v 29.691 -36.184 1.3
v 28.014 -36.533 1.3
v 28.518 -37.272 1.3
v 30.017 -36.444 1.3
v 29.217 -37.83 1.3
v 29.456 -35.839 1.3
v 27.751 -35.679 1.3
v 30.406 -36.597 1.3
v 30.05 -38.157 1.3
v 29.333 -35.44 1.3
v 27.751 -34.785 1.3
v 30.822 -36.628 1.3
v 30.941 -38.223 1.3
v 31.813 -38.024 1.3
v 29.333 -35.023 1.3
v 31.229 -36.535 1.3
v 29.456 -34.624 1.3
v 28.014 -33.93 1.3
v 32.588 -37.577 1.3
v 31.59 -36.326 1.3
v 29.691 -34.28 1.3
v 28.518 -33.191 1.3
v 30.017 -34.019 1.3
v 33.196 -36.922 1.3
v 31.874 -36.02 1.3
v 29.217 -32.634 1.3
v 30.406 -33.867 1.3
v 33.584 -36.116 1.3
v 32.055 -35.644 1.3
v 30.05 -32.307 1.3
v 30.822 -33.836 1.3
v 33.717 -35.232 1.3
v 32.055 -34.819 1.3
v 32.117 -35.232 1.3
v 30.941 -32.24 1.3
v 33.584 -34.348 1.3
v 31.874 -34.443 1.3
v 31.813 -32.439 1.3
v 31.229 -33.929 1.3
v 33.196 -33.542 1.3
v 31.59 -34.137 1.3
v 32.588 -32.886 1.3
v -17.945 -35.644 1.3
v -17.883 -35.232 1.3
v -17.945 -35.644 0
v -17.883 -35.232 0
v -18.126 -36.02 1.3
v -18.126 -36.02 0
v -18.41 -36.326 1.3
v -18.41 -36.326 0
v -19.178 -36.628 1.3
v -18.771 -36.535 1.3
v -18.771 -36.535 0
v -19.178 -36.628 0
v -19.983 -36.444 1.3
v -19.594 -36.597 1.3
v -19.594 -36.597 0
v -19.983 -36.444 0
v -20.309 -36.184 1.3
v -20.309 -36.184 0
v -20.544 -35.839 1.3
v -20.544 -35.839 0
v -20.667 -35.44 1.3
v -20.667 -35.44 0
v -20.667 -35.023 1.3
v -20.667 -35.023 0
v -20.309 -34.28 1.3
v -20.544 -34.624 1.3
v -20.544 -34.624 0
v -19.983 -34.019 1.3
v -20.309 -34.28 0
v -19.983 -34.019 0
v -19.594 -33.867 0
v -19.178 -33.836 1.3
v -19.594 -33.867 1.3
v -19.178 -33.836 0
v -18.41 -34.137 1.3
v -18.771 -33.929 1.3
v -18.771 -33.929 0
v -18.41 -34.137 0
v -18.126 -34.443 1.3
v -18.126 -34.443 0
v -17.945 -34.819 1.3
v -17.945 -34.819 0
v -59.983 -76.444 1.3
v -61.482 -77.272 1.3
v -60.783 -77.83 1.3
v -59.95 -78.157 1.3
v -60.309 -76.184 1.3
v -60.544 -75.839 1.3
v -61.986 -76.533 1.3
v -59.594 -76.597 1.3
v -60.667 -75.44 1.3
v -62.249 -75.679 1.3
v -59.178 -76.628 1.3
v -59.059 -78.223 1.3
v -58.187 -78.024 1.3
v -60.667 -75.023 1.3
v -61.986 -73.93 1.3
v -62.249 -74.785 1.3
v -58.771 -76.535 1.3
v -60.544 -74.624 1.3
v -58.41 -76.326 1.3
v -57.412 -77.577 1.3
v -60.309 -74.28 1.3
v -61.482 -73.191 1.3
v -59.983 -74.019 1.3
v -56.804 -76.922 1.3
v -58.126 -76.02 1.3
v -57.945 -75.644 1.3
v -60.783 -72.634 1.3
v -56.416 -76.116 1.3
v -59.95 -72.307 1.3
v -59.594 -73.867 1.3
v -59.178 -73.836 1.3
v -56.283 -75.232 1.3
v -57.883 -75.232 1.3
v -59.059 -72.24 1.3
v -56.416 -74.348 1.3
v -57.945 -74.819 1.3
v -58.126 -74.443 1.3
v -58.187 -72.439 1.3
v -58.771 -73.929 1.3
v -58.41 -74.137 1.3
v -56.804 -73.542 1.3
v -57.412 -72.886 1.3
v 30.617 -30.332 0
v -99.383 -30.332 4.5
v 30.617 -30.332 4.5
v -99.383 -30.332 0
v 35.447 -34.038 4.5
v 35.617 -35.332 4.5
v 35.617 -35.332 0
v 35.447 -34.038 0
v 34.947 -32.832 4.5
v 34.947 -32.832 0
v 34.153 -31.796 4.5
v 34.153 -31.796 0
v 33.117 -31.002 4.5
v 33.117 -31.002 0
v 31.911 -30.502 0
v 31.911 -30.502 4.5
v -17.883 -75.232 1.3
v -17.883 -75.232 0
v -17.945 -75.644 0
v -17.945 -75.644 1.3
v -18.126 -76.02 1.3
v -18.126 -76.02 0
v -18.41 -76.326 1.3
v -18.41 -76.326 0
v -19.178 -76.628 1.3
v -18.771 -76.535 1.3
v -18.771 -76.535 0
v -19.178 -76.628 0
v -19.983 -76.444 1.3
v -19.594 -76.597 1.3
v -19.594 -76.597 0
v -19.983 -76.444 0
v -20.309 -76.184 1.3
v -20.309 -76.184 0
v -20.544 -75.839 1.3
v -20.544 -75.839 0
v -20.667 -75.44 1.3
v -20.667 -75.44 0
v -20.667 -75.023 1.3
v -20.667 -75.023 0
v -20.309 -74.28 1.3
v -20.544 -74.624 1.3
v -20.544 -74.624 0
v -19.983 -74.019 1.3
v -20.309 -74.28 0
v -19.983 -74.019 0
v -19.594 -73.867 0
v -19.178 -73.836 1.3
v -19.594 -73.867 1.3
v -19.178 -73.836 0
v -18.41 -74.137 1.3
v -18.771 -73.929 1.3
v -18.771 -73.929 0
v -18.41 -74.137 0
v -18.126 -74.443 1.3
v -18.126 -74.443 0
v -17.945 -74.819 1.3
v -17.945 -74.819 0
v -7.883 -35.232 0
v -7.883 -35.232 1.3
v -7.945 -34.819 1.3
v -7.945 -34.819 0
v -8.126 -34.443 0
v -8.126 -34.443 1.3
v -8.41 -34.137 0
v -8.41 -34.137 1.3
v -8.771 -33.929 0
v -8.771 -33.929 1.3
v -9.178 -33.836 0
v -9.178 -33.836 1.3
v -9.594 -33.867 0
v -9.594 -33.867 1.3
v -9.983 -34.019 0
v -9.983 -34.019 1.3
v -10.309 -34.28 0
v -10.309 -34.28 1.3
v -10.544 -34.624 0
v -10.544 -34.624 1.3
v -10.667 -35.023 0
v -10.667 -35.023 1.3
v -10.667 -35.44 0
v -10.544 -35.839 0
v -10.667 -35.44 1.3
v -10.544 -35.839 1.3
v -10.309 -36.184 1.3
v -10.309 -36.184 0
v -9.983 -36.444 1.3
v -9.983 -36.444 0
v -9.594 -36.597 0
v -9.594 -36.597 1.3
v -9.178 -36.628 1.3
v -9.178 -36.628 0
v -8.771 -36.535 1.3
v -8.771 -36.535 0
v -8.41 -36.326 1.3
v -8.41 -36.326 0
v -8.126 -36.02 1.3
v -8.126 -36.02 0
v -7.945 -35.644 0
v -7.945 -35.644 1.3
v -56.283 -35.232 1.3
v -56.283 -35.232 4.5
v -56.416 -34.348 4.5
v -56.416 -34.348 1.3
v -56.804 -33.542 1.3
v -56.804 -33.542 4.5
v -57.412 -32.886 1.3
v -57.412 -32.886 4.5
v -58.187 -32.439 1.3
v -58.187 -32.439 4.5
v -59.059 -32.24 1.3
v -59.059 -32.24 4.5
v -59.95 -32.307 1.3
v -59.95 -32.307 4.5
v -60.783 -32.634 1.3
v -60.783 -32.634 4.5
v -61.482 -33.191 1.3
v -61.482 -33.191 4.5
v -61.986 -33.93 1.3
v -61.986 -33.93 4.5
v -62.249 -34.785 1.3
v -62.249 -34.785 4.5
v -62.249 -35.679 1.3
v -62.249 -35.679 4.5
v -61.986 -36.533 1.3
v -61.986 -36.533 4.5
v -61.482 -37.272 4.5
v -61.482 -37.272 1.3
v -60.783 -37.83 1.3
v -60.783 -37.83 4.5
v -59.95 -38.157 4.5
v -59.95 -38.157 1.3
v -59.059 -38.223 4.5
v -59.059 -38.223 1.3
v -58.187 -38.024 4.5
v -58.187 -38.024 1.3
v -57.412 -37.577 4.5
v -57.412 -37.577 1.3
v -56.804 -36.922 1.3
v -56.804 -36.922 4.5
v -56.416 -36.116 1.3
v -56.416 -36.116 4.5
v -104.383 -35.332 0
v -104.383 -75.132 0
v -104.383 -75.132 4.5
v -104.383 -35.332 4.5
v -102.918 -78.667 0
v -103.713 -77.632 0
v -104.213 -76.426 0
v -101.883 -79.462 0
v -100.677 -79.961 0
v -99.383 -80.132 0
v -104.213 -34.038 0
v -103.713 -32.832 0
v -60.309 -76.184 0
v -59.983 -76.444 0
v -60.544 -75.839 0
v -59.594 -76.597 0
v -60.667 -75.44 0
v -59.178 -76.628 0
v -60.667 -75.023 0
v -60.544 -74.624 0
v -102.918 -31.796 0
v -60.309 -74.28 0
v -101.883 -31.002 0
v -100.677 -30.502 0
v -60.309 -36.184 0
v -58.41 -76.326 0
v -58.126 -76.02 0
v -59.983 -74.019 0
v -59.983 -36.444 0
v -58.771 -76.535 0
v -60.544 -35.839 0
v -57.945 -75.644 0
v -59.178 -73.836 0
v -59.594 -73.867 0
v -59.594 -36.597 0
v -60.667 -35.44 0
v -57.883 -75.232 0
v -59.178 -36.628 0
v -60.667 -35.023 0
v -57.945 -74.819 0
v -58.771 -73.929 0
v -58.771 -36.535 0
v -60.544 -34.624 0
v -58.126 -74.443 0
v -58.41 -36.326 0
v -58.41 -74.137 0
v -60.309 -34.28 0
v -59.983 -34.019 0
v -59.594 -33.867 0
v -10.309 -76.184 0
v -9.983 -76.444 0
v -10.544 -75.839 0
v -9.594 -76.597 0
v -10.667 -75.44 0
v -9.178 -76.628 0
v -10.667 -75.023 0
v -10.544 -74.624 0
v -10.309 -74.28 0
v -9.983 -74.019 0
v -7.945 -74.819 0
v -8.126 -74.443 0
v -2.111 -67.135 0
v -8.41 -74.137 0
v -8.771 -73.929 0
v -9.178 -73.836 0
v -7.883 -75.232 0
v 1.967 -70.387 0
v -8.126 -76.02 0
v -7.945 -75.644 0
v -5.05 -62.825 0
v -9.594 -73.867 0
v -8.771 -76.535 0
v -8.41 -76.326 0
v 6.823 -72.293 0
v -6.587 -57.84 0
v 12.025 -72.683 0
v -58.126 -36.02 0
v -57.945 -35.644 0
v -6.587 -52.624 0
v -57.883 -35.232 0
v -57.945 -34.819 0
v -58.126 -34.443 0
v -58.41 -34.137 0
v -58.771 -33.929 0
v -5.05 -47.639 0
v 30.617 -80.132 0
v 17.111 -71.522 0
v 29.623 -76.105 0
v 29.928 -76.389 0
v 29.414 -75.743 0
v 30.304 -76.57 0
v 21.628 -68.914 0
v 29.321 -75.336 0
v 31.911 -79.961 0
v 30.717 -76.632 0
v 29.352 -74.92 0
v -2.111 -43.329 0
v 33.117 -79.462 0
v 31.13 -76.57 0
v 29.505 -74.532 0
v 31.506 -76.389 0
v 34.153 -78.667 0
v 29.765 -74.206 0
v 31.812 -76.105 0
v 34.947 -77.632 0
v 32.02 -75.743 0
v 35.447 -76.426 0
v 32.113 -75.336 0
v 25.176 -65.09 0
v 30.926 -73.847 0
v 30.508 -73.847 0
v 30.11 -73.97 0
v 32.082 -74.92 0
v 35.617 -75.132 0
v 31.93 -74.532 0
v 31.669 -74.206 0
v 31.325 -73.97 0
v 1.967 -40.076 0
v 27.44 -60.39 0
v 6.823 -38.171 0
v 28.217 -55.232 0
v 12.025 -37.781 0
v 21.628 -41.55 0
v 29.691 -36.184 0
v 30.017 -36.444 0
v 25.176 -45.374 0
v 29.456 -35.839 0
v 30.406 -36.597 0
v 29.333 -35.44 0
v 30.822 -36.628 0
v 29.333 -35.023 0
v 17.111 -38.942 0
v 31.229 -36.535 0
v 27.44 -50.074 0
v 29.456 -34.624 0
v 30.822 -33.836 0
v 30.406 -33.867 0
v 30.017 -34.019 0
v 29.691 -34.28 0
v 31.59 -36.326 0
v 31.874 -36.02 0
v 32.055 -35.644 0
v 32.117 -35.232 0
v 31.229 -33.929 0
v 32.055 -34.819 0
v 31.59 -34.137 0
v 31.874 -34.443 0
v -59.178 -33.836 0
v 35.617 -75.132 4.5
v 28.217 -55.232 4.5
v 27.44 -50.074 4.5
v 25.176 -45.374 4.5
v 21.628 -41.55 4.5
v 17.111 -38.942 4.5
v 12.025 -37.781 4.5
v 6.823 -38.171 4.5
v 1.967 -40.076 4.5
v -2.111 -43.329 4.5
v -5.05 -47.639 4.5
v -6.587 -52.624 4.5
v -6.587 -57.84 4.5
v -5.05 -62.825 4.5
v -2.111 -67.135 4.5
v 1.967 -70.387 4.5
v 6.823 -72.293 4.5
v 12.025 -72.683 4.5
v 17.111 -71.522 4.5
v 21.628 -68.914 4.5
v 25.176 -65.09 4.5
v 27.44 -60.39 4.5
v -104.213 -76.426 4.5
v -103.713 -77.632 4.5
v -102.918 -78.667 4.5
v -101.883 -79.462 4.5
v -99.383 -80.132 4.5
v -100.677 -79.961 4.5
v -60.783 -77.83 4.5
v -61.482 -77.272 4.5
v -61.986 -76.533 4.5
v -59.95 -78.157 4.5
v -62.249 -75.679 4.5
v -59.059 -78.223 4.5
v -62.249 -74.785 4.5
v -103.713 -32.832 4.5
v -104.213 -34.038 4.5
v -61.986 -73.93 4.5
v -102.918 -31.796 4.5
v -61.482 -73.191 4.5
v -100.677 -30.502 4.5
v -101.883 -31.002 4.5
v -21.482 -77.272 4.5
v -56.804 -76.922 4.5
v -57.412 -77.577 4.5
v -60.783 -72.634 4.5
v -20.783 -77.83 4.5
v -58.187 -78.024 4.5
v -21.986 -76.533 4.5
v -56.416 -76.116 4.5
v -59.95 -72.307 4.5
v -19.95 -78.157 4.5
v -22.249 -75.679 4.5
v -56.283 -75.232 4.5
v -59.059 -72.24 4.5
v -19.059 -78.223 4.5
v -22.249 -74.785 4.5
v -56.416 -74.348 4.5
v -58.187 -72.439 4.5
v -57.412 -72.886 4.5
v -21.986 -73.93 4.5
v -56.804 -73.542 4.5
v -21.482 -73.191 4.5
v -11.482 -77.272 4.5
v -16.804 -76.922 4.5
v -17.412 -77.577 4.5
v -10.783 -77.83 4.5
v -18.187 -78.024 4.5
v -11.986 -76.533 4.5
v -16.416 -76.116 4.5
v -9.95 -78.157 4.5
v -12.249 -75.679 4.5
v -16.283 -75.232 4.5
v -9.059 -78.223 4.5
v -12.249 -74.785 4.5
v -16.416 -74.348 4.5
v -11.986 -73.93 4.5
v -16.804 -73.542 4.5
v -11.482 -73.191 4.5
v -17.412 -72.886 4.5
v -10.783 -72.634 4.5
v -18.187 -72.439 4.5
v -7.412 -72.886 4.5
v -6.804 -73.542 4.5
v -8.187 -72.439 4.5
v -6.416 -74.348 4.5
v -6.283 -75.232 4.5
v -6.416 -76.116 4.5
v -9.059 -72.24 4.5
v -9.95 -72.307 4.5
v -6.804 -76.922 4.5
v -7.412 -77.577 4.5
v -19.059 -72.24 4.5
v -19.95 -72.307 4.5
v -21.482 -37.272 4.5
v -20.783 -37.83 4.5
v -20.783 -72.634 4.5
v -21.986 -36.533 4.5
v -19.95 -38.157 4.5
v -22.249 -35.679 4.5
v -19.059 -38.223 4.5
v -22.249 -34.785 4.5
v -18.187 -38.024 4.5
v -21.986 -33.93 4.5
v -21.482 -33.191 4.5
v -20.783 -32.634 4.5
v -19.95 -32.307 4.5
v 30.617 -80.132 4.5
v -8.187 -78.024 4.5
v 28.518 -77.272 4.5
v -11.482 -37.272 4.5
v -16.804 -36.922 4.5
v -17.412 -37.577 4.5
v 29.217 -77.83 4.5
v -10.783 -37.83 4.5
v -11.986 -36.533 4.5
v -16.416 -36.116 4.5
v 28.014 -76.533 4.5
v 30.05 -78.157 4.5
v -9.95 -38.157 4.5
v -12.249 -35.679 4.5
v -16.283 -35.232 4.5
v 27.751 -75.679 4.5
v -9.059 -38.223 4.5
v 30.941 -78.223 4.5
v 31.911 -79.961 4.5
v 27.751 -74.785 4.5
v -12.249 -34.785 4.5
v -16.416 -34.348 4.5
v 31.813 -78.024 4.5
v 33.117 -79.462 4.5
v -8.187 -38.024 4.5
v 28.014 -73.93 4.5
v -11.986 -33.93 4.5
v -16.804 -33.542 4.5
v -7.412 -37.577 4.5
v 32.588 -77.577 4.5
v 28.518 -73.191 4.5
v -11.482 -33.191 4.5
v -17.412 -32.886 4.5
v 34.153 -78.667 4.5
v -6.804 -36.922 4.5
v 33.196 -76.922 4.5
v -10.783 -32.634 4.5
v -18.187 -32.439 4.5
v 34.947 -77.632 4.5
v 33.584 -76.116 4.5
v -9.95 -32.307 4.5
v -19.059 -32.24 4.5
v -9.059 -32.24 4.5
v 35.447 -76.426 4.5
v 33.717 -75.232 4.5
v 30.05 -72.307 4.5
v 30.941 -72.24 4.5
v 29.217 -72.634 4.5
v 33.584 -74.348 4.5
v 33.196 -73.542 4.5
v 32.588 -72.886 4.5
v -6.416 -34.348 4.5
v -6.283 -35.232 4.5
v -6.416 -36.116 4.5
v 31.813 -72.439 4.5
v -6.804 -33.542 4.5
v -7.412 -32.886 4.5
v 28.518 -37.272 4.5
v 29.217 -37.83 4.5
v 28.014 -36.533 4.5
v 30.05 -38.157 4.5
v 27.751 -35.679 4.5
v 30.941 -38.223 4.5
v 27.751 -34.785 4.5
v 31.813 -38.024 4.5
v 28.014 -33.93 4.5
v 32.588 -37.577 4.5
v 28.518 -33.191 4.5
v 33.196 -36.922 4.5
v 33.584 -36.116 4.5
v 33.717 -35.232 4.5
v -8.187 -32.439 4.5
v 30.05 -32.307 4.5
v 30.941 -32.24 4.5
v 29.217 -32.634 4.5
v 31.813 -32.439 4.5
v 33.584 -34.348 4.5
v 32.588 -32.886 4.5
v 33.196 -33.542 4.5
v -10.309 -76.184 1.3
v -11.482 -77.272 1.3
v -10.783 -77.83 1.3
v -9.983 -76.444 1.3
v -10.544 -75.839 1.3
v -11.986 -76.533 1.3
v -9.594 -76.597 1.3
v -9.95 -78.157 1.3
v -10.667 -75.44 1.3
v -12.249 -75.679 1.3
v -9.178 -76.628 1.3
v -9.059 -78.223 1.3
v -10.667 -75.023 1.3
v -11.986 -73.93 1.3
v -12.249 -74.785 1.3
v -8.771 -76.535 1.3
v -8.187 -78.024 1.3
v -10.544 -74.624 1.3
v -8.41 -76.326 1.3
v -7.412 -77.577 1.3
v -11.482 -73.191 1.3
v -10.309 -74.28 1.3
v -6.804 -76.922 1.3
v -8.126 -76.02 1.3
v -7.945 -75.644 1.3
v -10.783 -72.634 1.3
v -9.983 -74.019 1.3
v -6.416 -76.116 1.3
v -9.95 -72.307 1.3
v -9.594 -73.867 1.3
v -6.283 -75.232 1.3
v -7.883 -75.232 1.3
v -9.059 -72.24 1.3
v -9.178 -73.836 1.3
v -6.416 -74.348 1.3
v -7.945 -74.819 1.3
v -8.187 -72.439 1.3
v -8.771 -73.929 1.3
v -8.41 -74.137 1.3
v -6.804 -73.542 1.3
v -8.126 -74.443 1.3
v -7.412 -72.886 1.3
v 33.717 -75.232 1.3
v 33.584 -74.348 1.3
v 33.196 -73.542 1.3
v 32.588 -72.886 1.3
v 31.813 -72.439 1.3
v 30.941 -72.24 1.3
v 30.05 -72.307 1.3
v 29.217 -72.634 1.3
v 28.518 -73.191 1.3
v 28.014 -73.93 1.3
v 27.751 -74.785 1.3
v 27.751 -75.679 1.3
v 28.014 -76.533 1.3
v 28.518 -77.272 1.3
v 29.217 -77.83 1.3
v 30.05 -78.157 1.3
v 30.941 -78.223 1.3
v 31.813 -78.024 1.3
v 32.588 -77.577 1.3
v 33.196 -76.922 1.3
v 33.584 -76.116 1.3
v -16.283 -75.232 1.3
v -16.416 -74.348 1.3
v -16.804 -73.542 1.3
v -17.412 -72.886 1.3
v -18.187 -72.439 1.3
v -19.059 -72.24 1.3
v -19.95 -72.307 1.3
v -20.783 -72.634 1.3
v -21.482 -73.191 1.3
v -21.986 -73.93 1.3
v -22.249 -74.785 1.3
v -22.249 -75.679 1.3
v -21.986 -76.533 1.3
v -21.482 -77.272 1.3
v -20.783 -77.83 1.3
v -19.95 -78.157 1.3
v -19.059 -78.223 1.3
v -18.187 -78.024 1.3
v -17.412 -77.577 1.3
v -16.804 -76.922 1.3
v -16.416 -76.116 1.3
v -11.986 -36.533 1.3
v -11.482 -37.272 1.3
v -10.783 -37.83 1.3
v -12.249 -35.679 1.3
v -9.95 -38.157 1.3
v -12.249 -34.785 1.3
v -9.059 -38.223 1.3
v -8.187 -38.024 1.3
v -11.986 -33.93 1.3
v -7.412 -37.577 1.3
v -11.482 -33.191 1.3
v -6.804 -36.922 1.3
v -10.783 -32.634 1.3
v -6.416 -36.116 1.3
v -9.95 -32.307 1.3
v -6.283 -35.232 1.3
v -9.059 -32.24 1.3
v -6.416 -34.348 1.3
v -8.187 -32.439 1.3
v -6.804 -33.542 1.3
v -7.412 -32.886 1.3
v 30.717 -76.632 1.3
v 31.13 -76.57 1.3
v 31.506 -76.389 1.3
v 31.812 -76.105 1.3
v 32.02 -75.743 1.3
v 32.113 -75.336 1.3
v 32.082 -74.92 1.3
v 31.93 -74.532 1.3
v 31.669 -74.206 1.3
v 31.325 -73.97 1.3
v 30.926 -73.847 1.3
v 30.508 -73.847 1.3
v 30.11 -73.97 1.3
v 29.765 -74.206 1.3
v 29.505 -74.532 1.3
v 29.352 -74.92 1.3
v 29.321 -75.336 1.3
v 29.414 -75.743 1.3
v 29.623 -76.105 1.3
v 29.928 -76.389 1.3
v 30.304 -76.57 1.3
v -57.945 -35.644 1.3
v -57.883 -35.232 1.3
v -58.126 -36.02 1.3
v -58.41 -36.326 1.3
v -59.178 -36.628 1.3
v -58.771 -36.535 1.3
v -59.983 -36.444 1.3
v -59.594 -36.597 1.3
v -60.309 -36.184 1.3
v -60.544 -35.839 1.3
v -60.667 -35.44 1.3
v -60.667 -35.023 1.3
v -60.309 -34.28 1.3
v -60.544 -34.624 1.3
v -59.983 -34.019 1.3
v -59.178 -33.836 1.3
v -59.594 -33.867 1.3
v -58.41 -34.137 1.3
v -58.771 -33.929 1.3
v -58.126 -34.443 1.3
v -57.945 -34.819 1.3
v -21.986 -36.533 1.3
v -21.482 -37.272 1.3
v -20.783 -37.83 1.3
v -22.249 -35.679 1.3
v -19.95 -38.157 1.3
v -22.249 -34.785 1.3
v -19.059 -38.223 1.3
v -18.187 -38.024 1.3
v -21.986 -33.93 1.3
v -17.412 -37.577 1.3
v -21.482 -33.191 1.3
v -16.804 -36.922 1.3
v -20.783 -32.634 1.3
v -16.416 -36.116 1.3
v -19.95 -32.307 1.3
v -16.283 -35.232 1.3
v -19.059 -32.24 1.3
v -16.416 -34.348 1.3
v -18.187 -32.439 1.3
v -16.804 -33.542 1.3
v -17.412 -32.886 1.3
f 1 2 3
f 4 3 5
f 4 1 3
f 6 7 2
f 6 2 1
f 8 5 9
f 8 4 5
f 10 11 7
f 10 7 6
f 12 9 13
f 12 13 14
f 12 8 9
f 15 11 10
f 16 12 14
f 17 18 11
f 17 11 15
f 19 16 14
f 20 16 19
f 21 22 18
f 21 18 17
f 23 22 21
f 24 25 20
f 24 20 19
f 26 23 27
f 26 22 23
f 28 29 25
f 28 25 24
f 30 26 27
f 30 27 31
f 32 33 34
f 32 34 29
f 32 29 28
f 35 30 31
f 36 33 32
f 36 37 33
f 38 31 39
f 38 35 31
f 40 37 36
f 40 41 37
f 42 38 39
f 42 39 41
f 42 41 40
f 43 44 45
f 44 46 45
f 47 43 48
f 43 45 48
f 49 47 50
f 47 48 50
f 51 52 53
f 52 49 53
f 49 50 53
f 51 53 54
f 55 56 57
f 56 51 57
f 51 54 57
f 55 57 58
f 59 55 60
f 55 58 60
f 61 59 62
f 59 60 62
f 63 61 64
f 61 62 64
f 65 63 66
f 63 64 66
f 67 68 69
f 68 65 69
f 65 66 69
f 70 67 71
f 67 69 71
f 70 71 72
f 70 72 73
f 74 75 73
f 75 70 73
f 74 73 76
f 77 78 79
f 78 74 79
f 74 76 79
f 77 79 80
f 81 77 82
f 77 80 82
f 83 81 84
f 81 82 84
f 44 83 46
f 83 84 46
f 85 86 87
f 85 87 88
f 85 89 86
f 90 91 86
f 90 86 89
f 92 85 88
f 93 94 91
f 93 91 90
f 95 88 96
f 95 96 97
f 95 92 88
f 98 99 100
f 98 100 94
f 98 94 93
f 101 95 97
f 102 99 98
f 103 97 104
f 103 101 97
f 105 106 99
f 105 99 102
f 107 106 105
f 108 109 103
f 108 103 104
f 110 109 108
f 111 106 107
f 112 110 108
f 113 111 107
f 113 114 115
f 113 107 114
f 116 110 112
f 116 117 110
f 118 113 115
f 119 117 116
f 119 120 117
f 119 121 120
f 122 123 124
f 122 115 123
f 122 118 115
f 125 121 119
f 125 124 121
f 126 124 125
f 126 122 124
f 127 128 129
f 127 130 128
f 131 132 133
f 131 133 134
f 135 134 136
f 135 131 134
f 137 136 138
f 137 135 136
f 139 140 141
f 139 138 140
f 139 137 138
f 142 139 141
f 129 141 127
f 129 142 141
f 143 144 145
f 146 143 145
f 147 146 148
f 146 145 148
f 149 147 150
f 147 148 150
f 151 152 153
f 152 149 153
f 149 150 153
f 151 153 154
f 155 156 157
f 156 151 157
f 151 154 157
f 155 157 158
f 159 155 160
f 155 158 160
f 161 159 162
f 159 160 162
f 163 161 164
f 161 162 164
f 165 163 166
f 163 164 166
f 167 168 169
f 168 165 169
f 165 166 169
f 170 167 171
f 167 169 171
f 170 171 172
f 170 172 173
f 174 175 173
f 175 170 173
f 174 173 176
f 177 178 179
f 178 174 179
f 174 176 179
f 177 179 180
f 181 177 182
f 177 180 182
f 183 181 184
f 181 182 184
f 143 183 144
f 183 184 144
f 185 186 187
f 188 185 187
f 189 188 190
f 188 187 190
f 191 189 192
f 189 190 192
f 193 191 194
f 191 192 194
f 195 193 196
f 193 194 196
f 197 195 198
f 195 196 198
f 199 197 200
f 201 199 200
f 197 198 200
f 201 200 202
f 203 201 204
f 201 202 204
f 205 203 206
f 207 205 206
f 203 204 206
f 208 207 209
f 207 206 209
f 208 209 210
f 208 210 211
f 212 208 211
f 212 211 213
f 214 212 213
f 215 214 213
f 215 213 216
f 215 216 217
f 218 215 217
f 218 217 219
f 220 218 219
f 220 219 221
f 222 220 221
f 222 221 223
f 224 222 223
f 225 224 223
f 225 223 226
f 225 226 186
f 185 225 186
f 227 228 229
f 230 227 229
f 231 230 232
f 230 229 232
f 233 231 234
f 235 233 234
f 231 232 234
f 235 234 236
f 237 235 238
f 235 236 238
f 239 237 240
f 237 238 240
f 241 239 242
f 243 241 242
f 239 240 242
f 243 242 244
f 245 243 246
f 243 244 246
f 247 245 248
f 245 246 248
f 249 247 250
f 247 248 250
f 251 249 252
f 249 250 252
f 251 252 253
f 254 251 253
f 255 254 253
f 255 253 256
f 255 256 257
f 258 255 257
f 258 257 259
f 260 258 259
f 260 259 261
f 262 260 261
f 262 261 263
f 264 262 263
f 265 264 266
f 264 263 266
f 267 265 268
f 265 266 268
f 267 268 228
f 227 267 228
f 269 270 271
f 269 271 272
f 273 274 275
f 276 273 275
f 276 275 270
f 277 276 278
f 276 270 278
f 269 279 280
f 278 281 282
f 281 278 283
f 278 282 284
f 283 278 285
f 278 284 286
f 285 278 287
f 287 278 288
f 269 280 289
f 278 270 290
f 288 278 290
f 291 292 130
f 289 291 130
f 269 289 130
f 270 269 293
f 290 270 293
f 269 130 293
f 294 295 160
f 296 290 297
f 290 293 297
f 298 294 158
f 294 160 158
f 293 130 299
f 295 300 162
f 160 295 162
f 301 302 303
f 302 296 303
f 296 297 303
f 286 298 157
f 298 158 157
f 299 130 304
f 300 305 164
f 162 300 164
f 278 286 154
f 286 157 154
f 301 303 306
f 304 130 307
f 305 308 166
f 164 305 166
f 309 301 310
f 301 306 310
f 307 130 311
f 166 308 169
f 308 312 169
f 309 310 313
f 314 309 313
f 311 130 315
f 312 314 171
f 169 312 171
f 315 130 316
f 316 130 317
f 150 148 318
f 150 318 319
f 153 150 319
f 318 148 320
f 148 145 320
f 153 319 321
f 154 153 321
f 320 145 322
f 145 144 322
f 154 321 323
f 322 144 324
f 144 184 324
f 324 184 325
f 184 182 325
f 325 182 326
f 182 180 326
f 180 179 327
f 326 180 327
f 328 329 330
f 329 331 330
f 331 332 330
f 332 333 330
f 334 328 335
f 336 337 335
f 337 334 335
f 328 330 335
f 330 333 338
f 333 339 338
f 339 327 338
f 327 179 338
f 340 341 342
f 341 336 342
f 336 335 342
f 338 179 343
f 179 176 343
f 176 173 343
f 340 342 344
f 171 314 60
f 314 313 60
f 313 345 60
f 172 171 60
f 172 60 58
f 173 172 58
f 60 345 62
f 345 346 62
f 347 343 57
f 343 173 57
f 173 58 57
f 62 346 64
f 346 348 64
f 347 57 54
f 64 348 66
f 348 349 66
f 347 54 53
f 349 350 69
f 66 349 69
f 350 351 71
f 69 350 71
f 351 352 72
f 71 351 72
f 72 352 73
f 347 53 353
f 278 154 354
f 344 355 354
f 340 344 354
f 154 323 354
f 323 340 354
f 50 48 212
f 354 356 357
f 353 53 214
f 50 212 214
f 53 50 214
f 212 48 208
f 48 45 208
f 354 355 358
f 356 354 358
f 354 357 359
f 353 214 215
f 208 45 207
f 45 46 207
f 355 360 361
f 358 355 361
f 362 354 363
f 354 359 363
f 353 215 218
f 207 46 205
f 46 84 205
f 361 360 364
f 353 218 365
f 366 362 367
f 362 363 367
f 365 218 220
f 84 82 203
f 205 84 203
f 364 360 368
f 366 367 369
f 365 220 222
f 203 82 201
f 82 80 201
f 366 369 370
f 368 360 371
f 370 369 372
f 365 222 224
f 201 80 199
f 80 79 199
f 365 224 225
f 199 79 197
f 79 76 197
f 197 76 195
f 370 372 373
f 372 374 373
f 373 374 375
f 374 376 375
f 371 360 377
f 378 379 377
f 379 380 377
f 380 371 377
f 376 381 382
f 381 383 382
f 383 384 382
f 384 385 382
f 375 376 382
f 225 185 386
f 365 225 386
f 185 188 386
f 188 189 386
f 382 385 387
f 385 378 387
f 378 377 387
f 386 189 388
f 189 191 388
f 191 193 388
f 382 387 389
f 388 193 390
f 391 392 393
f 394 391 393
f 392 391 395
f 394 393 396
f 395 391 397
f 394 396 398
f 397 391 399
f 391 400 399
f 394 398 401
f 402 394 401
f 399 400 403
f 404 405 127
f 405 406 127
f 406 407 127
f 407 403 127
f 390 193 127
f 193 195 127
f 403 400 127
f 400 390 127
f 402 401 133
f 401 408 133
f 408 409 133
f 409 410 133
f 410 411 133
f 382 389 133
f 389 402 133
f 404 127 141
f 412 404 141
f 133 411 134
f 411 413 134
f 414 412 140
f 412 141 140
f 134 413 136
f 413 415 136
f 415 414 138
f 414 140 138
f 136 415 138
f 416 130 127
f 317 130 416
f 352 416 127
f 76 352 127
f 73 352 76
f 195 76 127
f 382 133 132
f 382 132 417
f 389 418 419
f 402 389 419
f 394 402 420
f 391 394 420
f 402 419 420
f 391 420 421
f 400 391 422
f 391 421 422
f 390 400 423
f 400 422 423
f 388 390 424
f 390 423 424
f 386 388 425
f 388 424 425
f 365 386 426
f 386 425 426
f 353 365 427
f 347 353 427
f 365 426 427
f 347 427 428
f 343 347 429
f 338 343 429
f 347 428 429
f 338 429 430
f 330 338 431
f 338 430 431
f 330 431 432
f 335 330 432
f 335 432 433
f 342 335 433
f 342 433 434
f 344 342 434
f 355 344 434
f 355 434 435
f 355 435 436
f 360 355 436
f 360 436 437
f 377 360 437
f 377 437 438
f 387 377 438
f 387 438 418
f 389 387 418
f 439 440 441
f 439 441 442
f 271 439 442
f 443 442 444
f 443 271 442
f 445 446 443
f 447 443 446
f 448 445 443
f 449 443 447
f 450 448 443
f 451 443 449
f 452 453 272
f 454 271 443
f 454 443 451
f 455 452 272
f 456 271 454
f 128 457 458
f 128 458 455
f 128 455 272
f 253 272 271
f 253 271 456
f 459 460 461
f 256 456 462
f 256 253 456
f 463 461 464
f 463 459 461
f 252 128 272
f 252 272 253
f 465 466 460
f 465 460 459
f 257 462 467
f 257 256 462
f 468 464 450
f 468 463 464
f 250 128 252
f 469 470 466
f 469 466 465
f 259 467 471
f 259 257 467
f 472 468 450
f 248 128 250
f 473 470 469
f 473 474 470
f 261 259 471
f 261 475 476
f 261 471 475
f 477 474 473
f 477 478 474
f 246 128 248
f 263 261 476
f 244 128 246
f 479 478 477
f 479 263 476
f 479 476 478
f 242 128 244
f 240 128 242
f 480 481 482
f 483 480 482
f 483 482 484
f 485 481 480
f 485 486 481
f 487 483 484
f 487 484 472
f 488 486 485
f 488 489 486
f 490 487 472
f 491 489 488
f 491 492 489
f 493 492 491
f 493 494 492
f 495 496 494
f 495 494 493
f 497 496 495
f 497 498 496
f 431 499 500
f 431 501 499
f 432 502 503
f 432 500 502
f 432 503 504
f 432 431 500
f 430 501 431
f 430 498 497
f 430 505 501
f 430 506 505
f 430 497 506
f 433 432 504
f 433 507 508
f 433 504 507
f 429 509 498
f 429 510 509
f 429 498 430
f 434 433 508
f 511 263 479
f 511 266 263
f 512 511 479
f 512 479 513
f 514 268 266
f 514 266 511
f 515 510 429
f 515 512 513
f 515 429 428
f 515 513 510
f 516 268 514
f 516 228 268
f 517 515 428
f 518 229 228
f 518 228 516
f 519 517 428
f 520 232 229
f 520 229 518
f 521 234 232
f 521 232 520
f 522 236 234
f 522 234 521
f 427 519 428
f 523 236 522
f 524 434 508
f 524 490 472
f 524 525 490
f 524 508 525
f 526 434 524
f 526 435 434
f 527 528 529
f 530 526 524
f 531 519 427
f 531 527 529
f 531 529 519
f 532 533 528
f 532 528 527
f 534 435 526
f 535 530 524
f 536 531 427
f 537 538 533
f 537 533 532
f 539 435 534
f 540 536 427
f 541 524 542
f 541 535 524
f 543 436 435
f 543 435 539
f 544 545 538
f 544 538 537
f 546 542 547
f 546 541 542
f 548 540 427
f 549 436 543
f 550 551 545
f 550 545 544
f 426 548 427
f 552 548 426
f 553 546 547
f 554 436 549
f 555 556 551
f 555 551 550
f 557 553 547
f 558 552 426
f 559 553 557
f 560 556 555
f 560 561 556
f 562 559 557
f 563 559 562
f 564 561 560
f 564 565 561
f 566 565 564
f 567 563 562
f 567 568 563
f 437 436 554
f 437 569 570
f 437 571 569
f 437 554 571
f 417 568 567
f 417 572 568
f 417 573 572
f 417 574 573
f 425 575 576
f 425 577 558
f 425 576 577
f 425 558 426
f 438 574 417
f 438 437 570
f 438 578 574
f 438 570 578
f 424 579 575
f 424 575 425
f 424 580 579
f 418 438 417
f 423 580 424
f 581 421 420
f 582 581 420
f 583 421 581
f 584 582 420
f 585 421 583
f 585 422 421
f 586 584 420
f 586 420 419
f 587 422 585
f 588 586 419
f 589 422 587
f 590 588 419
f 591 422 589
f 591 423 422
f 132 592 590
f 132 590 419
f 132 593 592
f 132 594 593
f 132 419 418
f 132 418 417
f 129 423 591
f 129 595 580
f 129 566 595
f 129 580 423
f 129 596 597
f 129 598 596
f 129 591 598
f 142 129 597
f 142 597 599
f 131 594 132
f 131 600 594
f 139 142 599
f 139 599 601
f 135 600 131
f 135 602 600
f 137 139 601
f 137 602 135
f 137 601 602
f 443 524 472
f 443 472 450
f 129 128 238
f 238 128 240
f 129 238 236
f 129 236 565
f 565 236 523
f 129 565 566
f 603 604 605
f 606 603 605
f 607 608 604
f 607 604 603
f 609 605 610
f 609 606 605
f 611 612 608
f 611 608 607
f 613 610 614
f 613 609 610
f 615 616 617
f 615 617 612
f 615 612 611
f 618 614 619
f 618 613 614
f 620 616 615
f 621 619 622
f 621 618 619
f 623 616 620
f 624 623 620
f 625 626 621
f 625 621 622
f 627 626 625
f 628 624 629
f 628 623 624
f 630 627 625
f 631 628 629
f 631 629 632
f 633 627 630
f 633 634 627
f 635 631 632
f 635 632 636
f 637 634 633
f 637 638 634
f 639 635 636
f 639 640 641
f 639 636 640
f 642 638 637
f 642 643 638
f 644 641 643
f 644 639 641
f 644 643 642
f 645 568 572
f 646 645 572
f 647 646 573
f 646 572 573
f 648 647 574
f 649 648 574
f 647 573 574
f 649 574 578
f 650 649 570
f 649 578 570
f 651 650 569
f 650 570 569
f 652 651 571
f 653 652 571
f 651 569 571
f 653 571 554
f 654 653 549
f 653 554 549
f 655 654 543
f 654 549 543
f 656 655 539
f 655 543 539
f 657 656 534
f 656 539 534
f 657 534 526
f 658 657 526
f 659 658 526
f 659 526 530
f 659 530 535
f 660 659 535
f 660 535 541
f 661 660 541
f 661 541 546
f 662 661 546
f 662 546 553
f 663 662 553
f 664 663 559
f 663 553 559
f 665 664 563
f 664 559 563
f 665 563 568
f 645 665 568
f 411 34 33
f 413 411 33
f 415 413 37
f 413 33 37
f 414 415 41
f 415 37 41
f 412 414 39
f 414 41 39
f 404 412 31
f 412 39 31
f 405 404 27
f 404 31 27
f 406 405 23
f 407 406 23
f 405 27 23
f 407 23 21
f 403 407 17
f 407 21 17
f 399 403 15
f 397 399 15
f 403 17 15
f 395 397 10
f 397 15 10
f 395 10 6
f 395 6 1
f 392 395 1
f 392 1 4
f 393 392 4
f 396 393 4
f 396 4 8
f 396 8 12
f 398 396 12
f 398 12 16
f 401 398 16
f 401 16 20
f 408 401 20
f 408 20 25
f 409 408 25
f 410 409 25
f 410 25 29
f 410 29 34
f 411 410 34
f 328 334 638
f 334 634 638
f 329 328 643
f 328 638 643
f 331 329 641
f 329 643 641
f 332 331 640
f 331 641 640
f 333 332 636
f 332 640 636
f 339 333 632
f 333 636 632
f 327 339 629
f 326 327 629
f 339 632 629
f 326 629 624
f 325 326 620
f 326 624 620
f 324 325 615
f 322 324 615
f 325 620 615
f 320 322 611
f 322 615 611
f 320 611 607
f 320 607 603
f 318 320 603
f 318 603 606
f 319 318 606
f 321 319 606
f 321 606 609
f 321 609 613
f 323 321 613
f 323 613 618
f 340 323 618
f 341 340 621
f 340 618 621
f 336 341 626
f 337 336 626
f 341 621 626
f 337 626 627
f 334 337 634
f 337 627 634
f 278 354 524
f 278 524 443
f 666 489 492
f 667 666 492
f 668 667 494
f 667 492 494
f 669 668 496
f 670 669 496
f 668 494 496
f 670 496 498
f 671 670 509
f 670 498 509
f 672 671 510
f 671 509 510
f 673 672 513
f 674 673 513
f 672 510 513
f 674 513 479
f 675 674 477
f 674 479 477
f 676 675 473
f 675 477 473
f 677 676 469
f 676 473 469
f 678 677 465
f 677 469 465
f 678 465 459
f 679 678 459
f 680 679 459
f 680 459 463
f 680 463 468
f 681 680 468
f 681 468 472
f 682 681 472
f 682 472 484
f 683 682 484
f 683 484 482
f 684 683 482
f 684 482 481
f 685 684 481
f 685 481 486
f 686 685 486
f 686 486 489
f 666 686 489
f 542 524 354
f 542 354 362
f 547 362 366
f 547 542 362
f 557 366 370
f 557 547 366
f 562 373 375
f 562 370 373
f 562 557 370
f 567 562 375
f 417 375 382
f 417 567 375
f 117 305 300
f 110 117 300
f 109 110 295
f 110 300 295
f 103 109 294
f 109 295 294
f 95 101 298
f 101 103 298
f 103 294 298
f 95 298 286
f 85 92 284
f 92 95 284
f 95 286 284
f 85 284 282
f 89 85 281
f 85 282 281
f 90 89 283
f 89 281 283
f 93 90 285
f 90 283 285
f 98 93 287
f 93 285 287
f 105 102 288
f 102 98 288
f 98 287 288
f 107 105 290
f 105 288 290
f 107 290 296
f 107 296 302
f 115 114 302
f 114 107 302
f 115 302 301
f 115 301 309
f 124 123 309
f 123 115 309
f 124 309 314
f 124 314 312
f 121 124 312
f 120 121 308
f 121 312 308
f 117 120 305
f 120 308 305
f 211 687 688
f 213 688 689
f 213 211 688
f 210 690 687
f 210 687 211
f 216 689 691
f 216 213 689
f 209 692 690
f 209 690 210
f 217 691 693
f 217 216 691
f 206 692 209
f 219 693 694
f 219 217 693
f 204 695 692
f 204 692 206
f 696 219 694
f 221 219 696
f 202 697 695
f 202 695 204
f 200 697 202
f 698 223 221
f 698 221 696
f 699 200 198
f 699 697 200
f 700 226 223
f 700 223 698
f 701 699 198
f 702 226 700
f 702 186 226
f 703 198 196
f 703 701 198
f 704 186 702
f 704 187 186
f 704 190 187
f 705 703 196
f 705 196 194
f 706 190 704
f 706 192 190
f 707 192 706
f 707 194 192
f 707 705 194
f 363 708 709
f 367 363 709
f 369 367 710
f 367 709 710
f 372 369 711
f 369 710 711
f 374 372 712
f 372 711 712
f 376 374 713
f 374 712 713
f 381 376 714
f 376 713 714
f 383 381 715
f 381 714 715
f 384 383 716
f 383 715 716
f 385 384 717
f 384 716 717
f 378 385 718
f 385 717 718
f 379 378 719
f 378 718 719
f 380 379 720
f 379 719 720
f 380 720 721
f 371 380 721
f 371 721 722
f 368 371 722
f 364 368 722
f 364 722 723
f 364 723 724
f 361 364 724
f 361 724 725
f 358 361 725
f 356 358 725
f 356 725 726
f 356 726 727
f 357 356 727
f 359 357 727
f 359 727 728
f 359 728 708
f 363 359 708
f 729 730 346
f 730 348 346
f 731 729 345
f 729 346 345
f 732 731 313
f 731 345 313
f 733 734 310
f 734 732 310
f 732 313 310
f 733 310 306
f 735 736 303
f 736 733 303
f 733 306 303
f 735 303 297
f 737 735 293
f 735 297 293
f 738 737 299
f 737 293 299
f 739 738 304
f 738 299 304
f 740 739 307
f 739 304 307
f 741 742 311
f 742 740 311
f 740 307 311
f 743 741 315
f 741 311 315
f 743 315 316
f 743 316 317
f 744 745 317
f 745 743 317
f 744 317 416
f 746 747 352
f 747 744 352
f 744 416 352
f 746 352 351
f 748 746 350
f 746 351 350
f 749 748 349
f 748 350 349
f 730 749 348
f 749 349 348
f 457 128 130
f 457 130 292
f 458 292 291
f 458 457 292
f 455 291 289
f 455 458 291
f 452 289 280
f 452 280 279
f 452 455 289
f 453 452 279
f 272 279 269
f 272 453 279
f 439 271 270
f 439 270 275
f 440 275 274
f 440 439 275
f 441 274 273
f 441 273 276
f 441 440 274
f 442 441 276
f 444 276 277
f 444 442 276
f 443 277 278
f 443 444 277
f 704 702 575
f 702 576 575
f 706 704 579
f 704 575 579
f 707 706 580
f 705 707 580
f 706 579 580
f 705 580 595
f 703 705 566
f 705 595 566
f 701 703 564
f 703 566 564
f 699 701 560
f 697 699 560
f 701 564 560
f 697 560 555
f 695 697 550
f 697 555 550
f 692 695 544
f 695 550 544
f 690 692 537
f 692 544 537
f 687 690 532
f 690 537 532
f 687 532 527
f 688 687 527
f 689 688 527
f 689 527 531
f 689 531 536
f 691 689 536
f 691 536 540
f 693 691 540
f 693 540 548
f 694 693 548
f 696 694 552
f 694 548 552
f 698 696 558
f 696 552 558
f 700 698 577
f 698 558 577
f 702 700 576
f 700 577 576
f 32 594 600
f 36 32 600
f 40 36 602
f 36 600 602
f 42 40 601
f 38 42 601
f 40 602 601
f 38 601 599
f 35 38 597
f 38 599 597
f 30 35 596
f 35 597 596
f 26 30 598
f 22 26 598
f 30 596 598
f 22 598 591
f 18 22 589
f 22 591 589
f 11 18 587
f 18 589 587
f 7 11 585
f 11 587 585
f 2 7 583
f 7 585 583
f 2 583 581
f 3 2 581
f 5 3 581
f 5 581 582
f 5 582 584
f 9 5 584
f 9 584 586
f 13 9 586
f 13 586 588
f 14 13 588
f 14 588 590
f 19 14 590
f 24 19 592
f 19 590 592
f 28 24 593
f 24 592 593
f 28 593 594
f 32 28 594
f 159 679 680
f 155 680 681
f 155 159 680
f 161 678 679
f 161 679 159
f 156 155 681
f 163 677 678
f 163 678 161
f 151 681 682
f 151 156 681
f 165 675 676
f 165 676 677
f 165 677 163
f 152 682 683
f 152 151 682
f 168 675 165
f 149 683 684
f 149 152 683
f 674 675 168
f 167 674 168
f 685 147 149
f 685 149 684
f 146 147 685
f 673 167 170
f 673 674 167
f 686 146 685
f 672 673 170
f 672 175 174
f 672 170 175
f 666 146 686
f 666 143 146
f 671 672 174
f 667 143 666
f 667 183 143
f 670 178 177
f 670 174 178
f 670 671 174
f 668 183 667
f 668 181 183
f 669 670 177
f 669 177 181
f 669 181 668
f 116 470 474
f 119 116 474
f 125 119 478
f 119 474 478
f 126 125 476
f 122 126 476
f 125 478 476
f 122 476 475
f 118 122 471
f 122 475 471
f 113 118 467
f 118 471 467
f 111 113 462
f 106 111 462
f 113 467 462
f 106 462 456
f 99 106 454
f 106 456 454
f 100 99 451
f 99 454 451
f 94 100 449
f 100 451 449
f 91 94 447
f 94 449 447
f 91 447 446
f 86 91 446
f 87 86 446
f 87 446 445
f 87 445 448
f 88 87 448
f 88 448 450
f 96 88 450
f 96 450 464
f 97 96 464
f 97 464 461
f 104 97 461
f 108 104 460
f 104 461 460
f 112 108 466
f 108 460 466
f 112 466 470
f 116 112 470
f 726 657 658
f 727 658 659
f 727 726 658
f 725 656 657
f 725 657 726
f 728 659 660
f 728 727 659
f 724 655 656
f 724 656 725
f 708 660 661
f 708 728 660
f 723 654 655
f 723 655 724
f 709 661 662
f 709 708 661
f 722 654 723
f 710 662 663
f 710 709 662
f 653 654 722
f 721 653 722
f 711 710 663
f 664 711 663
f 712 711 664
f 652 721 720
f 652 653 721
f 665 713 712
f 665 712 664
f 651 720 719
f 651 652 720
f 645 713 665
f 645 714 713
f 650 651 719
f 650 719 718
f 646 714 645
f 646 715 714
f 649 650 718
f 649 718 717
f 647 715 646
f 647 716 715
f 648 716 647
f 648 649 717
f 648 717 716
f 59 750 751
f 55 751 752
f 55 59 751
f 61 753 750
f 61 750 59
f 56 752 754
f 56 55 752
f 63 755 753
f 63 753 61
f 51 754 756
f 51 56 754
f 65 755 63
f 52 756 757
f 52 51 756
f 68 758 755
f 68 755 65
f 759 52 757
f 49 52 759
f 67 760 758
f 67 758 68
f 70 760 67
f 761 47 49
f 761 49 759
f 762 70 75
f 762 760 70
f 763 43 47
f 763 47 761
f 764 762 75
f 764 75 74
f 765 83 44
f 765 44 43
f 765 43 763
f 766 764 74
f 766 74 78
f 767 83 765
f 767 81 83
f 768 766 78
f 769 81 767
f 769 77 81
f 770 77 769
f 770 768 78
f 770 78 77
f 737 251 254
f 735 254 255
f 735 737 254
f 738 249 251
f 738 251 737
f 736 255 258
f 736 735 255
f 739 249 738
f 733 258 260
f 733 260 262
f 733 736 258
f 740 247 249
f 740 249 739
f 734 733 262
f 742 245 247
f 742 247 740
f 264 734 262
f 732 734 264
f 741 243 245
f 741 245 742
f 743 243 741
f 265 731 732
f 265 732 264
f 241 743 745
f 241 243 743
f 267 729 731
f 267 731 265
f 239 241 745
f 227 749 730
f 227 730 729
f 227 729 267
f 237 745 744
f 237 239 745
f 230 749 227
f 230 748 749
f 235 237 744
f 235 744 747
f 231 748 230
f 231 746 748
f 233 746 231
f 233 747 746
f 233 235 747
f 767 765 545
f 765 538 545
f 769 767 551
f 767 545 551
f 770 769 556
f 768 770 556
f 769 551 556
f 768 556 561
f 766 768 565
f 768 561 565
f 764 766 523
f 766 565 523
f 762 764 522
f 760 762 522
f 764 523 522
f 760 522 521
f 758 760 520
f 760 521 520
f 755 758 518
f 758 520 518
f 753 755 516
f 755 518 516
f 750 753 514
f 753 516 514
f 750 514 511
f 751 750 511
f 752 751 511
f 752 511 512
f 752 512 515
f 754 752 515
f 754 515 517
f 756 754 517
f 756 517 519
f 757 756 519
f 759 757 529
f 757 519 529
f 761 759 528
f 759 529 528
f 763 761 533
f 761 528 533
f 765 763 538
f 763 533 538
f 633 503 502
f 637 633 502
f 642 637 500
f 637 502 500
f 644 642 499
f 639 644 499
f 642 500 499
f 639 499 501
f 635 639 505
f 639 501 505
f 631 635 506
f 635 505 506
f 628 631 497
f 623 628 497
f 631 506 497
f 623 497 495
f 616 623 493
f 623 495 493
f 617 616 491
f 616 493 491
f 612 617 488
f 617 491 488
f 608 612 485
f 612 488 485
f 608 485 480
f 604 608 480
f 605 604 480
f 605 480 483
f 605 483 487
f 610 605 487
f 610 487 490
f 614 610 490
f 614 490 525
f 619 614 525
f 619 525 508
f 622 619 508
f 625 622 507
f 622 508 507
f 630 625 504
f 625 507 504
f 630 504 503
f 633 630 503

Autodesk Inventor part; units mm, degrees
ref_plane "YZ Plane" through (0, 0, 0) normal (1, 0, 0) x (0, 1, 0)
ref_plane "XZ Plane" through (0, 0, 0) normal (0, 1, 0) x (-1, 0, 0)
ref_plane "XY Plane" through (0, 0, 0) normal (0, 0, 1) x (1, 0, 0)
sketch "Sketch1" plane through (0, 0, 0) normal (0, 0, 1) x (1, 0, 0)
  line L0 (-16.3829, -30.3318) -> (-62.1829, -30.3318)
  line L1 (-64.1829, -80.1318) -> (-14.3829, -80.1318) construction
  line L2 (35.6171, -80.1318) -> (-104.3829, -80.1318)
  line L3 (-104.3829, -80.1318) -> (-104.3829, -30.3318)
  line L4 (-104.3829, -30.3318) -> (35.6171, -30.3318)
  line L5 (35.6171, -30.3318) -> (35.6171, -80.1318)
  line L6 (-14.3829, -78.1318) -> (-14.3829, -32.3318)
  circle A0 centre (-19.2829, -75.2318) radius 1.4
  circle A1 centre (-59.2829, -75.2318) radius 1.4
  circle A2 centre (-19.2829, -35.2318) radius 1.4
  circle A3 centre (-59.2829, -35.2318) radius 1.4
extrude "Extrusion1" add sketch "Sketch1" along normal blind 4.5
sketch "Sketch4" plane through (0, 0, 4.5) normal (0, 0, 1) x (1, 0, 0)
  circle A0 centre (10.7171, -55.2318) radius 16.9 construction
  circle A1 centre (-9.2829, -35.2318) radius 1.45 projected
  circle A2 centre (30.7171, -35.2318) radius 1.45 projected
  arc A3 (-9.2829, -73.8318) -> (-9.2829, -76.6318) centre (-9.2829, -75.2318) ccw projected
  arc A4 (-9.2829, -73.8318) -> (-9.2829, -76.6318) centre (-9.2829, -75.2318) ccw projected
  arc A5 (30.7171, -76.6318) -> (30.7171, -73.8318) centre (30.7171, -75.2318) ccw projected
  circle A6 centre (30.7171, -75.2318) radius 1.4
  circle A7 centre (30.7171, -35.2318) radius 1.4
  circle A8 centre (-9.2829, -75.2318) radius 1.4
  circle A9 centre (-9.2829, -35.2318) radius 1.4
  circle A10 centre (10.7171, -55.2318) radius 17.5
  point P0 (0, 0)
  dimension "d44" = 2.8
  dimension "d45" = 2.8
  dimension "d46" = 2.8
  dimension "d47" = 2.8
  dimension "d48" = 35
extrude "Extrusion3" cut sketch "Sketch4" against normal through all contours A8 A3 | A6 A5 | A7 | A9 | A10
sketch "Sketch3" plane through (0, 0, 4.5) normal (0, 0, 1) x (1, 0, 0)
  circle A0 centre (-9.2829, -35.2318) radius 1.4 projected
  circle A1 centre (-9.2829, -75.2318) radius 1.4 projected
  circle A2 centre (30.7171, -75.2318) radius 1.4 projected
  circle A3 centre (10.7171, -55.2318) radius 17.5 projected
  circle A4 centre (30.7171, -35.2318) radius 1.4 projected
  circle A5 centre (-59.2829, -35.2318) radius 1.4 projected
  circle A6 centre (-19.2829, -35.2318) radius 1.4 projected
  circle A7 centre (-59.2829, -75.2318) radius 1.4 projected
  circle A8 centre (-19.2829, -75.2318) radius 1.4 projected
  line L0 (-104.3829, -80.1318) -> (35.6171, -80.1318) projected
  line L1 (35.6171, -80.1318) -> (35.6171, -30.3318) projected
  line L2 (35.6171, -30.3318) -> (-104.3829, -30.3318) projected
  line L3 (-104.3829, -30.3318) -> (-104.3829, -80.1318) projected
  circle A9 centre (30.7171, -75.2318) radius 3
  circle A10 centre (-9.2829, -75.2318) radius 3
  circle A11 centre (-19.2829, -75.2318) radius 3
  circle A12 centre (-59.2829, -75.2318) radius 3
  circle A13 centre (30.7171, -35.2318) radius 3
  circle A14 centre (-9.2829, -35.2318) radius 3
  circle A15 centre (-19.2829, -35.2318) radius 3
  circle A16 centre (-59.2829, -35.2318) radius 3
  dimension "d51" = 1.6
  dimension "d52" = 1.6
  dimension "d53" = 1.6
  dimension "d54" = 1.6
  dimension "d55" = 1.6
  dimension "d56" = 1.6
  dimension "d57" = 1.6
  dimension "d58" = 1.6
extrude "Extrusion2" cut sketch "Sketch3" against normal blind 3.2 contours A9 | A10 | A11 | A12 | A13 | A14 | A15 | A16
fillet "Fillet1" radius 5 4 edges at (35.6171, -30.3318, 2.25) (-104.3829, -30.3318, 2.25) (-104.3829, -80.1318, 2.25) (35.6171, -80.1318, 2.25)
equation "\"d44\" = d40"
equation "\"d45\" = d40"
equation "\"d46\" = d40"
equation "\"d47\" = d40"
equation "\"d52\" = d51"
equation "\"d53\" = d51"
equation "\"d54\" = d51"
equation "\"d55\" = d51"
equation "\"d56\" = d51"
equation "\"d57\" = d51"
equation "\"d58\" = d51"
equation "\"d41\" = d40"
equation "\"d42\" = d40"
equation "\"d43\" = d40"
equation "\"d40\" = 2.8"
properties part number "30_Smartphone_Holder"
